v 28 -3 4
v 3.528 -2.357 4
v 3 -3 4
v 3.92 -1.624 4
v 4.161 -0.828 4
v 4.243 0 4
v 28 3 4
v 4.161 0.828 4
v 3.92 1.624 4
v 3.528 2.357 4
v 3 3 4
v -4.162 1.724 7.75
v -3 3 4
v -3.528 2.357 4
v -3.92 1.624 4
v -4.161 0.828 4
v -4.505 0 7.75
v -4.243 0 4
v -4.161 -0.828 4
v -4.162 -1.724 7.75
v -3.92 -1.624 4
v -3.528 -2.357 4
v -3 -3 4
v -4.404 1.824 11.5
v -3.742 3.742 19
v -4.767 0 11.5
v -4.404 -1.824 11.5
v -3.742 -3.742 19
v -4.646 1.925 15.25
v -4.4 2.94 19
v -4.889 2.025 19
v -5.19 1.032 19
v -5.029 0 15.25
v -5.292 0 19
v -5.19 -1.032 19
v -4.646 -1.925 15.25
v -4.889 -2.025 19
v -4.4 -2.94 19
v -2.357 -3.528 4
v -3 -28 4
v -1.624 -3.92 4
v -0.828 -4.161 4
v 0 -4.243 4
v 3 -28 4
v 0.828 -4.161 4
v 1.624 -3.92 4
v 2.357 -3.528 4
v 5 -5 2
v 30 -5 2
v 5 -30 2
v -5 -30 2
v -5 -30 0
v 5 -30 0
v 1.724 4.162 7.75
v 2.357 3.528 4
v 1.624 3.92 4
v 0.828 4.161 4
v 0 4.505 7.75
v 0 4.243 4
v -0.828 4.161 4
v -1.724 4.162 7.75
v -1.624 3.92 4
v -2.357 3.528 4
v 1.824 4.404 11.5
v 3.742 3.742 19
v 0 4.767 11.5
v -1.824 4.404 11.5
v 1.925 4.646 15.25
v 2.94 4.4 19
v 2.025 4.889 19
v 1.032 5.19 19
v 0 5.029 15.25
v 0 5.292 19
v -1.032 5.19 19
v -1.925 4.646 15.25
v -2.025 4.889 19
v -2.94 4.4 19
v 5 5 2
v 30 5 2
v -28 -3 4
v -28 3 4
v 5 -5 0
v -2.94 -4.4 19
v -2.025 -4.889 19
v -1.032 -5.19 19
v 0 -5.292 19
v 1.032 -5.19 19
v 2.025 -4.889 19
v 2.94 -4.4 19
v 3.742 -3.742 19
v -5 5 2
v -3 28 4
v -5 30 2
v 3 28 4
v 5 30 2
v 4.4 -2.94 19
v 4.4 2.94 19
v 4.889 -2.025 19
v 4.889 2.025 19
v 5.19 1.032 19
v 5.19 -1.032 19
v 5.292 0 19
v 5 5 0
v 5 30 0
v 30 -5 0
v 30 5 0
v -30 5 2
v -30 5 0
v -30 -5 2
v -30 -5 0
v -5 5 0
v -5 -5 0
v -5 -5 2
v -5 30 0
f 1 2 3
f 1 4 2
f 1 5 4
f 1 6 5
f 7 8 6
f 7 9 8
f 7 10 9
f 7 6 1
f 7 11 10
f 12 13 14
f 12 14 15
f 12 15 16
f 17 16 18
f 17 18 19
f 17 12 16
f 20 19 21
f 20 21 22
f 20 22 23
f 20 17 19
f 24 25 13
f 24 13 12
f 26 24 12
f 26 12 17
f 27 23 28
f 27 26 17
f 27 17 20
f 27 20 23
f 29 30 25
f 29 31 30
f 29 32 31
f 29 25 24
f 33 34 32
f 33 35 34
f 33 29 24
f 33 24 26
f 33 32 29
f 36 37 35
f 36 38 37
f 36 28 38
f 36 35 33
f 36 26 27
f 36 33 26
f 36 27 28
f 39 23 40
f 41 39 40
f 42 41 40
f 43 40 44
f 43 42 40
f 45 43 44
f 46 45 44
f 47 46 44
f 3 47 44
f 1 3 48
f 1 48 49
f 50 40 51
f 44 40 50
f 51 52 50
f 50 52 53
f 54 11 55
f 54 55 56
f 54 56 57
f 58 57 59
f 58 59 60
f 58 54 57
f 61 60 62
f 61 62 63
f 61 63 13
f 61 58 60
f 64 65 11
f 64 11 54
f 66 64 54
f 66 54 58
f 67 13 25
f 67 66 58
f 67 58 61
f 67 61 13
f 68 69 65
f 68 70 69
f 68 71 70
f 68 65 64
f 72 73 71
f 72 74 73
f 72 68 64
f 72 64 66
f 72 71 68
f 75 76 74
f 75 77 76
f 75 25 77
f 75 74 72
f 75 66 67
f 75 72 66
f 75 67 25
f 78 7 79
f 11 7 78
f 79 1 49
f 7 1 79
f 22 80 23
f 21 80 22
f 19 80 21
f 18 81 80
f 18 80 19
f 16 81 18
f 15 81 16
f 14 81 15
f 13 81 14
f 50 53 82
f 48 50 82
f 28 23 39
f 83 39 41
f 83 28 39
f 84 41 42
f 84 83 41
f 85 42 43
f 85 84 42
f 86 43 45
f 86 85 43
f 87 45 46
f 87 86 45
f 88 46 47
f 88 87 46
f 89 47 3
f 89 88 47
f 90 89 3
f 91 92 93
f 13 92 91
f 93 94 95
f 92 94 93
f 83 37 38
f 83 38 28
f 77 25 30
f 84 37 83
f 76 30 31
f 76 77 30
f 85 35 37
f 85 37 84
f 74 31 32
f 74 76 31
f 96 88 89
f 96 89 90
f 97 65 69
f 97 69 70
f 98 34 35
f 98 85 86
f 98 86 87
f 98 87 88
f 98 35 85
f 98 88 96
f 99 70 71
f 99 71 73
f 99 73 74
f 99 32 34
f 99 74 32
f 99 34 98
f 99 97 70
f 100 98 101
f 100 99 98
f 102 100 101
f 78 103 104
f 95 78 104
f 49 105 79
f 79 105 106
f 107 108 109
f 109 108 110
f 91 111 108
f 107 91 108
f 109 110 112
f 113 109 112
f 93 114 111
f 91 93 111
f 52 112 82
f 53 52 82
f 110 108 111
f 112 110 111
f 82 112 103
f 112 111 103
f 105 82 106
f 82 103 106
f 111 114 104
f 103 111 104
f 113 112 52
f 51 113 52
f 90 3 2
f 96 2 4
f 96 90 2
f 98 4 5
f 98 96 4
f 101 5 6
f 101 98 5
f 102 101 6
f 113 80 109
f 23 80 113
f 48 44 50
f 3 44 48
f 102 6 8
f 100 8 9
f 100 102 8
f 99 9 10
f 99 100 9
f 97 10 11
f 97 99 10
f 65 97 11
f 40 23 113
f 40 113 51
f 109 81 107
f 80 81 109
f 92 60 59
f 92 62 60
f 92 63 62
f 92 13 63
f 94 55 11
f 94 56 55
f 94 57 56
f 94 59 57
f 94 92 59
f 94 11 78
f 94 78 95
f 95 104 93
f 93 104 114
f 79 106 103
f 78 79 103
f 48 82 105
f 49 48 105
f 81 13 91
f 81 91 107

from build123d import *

# Parameters (mm, degrees)
F1_DEPTH = 4
F2_SIZE  = 2
F4_DEPTH = 15
F4_TAPER = -4


with BuildPart() as f1:
    # F0 (on Top) → F1 (new body)
    with BuildSketch(Plane.XY):
        Polygon((5, -30), (5, -5), (30, -5), (30, 5), (5, 5), (5, 30), (-5, 30), (-5, 5), (-30, 5), (-30, -5), (-5, -5), (-5, -30), align=None)
    extrude(amount=F1_DEPTH)

    # F2
    f2_edges = [f1.edges().sort_by_distance(p)[0] for p in [
        (-5, 17.5, 4),
        (0, 30, 4),
        (5, 17.5, 4),
        (-17.5, 5, 4),
        (-17.5, -5, 4),
        (-30, 0, 4),
        (-5, -17.5, 4),
        (0, -30, 4),
        (5, -17.5, 4),
        (17.5, -5, 4),
        (17.5, 5, 4),
        (30, 0, 4),
    ]]
    chamfer(f2_edges, length=F2_SIZE)

    # F3 (on face) → F4 (join)
    with BuildSketch(Plane.XY.offset(4)):
        with BuildLine():
            ThreePointArc((3, -3), (3.9196888946, -1.6235883004), (4.2426406871, 0))
            ThreePointArc((4.2426406871, 0), (3.9196888946, 1.6235883004), (3, 3))
            ThreePointArc((3, 3), (0, 4.2426406871), (-3, 3))
            ThreePointArc((-3, 3), (-4.2426406871, 0), (-3, -3))
            ThreePointArc((-3, -3), (0, -4.2426406871), (3, -3))
        make_face()
    extrude(amount=F4_DEPTH, taper=F4_TAPER)


solid = f1.part
